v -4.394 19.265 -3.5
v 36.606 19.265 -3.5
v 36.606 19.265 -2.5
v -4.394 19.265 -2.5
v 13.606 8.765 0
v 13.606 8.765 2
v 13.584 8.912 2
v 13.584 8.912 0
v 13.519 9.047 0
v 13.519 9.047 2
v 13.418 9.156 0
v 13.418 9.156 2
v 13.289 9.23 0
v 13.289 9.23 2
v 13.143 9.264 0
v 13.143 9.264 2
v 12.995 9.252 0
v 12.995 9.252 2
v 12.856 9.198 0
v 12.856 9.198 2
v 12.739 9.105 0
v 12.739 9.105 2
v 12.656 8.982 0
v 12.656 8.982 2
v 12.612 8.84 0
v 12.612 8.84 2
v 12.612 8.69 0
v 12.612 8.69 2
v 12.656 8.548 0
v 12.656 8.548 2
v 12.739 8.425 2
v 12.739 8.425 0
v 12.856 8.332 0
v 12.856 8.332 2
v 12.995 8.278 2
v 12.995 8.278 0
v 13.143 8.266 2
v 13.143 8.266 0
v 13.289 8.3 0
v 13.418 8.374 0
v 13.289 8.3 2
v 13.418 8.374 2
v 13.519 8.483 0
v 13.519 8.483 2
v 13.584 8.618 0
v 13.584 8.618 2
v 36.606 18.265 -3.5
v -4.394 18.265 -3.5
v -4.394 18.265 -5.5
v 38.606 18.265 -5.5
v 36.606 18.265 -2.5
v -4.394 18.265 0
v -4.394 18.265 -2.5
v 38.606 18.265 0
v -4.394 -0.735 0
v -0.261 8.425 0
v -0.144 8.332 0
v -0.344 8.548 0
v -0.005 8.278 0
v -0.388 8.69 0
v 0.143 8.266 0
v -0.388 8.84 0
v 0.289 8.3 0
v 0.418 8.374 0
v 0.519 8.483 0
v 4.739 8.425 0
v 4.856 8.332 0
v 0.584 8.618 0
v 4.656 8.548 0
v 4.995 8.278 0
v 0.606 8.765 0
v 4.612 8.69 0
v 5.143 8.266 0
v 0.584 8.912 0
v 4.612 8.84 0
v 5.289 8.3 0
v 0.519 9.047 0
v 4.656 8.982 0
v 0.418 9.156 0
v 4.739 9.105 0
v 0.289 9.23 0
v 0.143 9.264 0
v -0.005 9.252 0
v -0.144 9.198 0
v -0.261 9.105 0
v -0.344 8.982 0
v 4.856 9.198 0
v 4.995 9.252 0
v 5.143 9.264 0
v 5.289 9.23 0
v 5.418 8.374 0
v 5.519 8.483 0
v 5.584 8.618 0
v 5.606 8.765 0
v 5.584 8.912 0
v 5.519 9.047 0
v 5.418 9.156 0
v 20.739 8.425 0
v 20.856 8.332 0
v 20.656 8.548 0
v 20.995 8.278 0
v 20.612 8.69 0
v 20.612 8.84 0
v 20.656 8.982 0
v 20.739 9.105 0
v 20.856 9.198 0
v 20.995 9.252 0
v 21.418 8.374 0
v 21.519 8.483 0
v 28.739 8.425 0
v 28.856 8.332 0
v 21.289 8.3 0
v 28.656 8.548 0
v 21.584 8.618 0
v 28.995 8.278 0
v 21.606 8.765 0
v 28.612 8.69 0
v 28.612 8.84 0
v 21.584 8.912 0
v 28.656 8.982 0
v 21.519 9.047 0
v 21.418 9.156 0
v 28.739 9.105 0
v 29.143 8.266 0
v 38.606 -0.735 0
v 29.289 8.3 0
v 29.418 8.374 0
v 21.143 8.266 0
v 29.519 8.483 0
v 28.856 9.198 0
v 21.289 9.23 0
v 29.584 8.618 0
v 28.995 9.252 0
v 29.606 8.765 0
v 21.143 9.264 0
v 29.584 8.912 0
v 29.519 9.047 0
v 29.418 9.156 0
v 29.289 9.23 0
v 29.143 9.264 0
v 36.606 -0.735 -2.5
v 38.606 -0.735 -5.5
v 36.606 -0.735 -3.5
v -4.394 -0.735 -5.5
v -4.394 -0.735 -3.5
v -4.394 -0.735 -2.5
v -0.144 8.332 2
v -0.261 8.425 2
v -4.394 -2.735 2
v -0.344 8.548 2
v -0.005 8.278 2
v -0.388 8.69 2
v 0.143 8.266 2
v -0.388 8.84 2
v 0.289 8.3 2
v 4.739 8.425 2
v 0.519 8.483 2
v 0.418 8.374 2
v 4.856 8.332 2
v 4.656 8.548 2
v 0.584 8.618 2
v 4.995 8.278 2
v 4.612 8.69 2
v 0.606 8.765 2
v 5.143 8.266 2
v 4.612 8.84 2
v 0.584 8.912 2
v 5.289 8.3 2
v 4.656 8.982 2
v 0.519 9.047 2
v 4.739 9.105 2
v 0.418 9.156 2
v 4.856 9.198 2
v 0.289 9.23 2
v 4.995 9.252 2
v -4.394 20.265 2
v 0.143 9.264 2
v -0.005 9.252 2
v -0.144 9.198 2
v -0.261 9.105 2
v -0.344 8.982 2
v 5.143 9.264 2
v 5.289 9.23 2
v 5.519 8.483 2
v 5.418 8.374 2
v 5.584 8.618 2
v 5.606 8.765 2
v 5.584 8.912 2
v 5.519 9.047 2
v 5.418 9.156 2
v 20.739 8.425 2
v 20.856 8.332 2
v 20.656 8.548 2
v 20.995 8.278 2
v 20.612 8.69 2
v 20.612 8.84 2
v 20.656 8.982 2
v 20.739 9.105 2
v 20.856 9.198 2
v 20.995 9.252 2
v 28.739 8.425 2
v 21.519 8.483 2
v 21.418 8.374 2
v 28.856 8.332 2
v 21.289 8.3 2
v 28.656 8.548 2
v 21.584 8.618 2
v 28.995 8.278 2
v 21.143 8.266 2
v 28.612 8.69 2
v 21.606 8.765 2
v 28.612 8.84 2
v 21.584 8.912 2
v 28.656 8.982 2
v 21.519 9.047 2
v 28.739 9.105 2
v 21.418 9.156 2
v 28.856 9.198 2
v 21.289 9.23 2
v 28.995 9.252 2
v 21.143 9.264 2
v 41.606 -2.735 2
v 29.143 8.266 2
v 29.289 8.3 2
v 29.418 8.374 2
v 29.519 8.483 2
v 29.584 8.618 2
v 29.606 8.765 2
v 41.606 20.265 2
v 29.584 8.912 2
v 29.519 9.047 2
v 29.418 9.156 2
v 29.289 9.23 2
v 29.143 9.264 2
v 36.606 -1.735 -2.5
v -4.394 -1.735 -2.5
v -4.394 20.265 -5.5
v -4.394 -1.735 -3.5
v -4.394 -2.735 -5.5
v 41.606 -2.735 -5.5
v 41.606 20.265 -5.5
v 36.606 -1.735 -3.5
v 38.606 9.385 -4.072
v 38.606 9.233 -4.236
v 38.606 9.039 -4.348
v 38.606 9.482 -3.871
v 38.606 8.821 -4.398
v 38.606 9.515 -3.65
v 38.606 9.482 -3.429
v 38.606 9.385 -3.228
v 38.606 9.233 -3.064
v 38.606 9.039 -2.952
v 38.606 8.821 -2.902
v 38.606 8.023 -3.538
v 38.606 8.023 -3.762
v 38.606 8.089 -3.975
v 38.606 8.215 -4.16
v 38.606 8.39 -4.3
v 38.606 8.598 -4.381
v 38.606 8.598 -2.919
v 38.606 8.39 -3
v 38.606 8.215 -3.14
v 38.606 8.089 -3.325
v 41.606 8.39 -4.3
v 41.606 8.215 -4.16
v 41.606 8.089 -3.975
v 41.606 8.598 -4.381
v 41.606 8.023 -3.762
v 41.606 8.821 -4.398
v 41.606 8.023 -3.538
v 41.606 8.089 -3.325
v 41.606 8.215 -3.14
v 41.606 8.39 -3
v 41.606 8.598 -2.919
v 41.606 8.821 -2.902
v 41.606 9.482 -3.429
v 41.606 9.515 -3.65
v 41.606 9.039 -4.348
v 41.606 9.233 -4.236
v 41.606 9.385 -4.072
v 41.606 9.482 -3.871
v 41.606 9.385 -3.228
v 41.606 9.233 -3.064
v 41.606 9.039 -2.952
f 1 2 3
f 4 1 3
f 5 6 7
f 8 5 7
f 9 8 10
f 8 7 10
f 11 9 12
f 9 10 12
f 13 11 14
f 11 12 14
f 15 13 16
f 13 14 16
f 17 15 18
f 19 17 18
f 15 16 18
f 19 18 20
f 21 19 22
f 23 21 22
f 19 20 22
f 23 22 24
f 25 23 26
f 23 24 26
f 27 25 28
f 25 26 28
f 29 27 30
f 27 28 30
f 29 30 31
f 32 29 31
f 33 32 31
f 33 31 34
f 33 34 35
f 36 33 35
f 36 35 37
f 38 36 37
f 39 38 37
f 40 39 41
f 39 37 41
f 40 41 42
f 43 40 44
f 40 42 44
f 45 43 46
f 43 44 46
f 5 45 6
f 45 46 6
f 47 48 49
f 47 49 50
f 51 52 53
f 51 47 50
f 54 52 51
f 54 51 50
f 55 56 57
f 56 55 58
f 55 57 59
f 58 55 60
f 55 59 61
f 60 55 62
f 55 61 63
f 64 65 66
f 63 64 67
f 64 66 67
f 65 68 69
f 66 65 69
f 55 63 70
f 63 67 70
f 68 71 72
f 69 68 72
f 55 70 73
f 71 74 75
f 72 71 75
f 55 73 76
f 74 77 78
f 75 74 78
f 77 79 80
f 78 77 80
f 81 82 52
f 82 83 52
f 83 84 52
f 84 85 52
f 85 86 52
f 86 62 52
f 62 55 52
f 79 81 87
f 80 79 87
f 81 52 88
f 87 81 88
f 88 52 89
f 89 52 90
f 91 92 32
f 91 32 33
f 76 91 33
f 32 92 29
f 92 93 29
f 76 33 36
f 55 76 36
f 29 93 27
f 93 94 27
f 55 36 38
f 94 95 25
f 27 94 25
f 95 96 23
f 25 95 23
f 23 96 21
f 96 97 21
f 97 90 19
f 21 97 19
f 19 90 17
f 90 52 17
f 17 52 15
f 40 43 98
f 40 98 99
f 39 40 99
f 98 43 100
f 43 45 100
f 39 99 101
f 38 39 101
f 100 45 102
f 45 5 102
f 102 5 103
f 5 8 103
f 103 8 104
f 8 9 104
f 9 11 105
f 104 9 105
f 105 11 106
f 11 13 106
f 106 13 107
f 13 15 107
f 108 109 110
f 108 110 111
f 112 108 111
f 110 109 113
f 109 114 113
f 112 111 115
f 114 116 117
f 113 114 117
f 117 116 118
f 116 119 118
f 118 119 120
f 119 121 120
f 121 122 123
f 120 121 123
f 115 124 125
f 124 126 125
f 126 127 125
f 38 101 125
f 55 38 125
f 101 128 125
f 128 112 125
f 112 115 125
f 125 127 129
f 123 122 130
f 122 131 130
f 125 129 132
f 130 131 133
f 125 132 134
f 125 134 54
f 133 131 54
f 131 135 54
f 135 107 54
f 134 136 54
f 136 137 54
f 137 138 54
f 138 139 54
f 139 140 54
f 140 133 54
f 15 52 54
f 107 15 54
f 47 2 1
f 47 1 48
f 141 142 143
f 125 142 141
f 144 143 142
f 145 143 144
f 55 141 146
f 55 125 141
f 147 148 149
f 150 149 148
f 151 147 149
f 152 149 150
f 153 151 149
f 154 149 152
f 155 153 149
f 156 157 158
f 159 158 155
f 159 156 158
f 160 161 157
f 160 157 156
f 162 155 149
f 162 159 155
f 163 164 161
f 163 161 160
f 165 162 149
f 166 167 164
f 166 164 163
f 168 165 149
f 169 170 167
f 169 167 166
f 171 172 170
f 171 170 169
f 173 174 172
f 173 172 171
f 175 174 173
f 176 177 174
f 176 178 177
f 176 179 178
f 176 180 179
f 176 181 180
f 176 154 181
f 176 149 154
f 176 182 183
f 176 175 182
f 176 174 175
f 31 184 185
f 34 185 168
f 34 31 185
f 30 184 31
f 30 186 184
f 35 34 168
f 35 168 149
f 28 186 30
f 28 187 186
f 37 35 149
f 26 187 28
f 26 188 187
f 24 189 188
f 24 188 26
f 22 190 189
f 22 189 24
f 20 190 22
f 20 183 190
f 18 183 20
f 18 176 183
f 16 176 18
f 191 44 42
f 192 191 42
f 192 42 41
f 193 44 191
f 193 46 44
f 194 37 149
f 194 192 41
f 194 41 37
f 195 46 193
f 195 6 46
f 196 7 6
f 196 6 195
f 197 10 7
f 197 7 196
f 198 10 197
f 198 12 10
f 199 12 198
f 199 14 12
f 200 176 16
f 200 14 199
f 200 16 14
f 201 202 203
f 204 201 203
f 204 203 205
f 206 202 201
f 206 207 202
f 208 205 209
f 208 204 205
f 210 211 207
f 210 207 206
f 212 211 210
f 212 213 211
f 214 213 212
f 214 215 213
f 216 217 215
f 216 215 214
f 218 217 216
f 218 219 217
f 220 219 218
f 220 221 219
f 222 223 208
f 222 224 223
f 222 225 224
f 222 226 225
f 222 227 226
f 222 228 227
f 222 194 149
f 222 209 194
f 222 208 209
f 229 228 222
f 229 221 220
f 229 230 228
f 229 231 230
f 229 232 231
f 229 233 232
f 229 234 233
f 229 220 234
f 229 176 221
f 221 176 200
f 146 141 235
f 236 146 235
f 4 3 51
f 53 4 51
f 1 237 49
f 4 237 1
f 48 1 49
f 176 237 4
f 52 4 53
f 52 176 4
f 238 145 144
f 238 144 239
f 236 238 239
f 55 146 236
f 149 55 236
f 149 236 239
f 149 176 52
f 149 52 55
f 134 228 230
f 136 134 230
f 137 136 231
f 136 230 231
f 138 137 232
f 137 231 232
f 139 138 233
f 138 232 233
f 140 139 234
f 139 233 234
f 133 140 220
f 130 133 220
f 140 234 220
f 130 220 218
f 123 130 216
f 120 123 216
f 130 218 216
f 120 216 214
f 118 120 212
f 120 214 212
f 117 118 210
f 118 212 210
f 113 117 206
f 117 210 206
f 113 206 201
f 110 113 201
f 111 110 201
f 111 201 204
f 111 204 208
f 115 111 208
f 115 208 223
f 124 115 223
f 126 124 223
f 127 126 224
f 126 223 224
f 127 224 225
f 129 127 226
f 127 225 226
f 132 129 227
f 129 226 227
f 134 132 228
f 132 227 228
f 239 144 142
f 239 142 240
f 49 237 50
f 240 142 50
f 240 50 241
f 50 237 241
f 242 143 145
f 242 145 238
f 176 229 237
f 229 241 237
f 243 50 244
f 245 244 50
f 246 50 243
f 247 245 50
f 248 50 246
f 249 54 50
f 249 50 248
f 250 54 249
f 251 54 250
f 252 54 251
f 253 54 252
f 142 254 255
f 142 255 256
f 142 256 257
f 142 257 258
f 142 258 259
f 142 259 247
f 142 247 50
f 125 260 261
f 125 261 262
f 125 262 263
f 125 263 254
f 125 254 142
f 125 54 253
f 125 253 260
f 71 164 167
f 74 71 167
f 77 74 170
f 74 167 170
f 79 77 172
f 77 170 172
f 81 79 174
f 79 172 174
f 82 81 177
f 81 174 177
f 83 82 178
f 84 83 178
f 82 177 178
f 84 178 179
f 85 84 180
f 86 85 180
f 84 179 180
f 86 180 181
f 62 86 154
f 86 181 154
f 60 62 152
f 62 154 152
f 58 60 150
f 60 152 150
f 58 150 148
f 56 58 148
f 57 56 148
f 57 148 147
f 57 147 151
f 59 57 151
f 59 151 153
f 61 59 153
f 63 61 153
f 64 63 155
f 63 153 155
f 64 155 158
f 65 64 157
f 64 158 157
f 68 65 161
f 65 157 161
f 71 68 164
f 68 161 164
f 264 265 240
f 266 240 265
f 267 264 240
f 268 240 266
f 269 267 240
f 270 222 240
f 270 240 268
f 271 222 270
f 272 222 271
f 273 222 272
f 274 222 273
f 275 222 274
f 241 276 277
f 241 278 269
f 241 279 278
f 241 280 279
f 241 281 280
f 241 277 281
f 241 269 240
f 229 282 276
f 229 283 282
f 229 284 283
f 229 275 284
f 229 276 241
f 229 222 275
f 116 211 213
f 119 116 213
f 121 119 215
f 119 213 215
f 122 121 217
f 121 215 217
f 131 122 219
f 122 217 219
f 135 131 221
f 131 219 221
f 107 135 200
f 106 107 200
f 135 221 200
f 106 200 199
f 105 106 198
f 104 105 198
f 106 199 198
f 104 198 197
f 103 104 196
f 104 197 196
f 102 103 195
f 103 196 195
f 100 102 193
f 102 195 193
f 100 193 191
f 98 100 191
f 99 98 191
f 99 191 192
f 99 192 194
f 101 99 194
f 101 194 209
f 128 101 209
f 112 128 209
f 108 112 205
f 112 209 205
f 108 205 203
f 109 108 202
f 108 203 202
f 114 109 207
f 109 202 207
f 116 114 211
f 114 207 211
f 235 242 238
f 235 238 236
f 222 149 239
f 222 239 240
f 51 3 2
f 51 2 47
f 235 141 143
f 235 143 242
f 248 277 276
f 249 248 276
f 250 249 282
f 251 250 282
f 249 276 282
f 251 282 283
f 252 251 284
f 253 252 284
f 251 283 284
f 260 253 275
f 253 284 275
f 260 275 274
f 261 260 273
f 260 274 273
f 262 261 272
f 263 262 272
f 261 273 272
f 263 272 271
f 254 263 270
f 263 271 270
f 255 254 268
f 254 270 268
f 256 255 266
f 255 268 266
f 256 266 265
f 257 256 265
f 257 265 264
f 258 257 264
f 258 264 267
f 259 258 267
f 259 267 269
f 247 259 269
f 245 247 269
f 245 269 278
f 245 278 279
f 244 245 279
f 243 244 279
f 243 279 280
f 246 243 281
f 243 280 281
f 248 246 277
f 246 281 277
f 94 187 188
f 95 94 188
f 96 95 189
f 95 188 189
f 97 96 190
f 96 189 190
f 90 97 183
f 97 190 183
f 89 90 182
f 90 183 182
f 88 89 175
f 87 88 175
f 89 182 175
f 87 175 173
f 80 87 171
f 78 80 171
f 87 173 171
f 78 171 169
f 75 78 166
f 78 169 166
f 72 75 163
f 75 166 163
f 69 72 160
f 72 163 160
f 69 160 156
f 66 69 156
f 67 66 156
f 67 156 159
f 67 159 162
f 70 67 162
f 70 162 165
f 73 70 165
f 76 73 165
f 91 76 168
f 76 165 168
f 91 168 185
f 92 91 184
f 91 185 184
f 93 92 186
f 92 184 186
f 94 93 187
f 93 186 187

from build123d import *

# Parameters (mm, degrees)
F0_W     = 43
F0_H     = 19
F1_DEPTH = 2
F2_DEPTH = 5.5
F3_W     = 1
F3_H     = 1
F4_DEPTH = 41
F5_R     = 0.75
F6_DEPTH = 3
F7_R     = 0.5
F8_DEPTH = 2


with BuildPart() as f1:
    # F0 (on Top) → F1 (new body)
    with BuildSketch(Plane.XY):
        with Locations((17.1059944248, 8.7649840168)):
            Rectangle(F0_W, F0_H)
        Polygon((-4.3940055752, -0.7350159832), (-4.3940055752, -2.7350159832), (41.6059944248, -2.7350159832), (41.6059944248, 20.2649840168), (-4.3940055752, 20.2649840168), (-4.3940055752, 18.2649840168), (38.6059944248, 18.2649840168), (38.6059944248, -0.7350159832), align=None)
    extrude(amount=F1_DEPTH)

    # F0 (on Top) → F2 (join)
    with BuildSketch(Plane.XY):
        Polygon((-4.3940055752, -0.7350159832), (-4.3940055752, -2.7350159832), (41.6059944248, -2.7350159832), (41.6059944248, 20.2649840168), (-4.3940055752, 20.2649840168), (-4.3940055752, 18.2649840168), (38.6059944248, 18.2649840168), (38.6059944248, -0.7350159832), align=None)
    extrude(amount=-F2_DEPTH)

    # F3 (on face) → F4 (cut)
    with BuildSketch(Plane(origin=(-4.3940055752, 0, 0), x_dir=(0, -1, 0), z_dir=(-1, 0, 0))):
        with Locations((-18.7649840168, -3)):
            Rectangle(F3_W, F3_H)
        with Locations((1.2350159832, -3)):
            Rectangle(F3_W, F3_H)
    extrude(amount=-F4_DEPTH, mode=Mode.SUBTRACT)

    # F5 (on face) → F6 (cut, through all)
    with BuildSketch(Plane.YZ.offset(41.6059944248)):
        with Locations((8.7649840168, -3.65)):
            Circle(F5_R)
    extrude(amount=-F6_DEPTH, mode=Mode.SUBTRACT)

    # F7 (on face) → F8 (cut, through all)
    with BuildSketch(Plane.XY.offset(2)):
        with Locations((5.1059944248, 8.7649840168)):
            Circle(F7_R)
        with Locations((13.1059944248, 8.7649840168)):
            Circle(F7_R)
        with Locations((21.1059944248, 8.7649840168)):
            Circle(F7_R)
        with Locations((29.1059944248, 8.7649840168)):
            Circle(F7_R)
        with Locations((0.1059944248, 8.7649840168)):
            Circle(F7_R)
    extrude(amount=-F8_DEPTH, mode=Mode.SUBTRACT)


solid = f1.part
